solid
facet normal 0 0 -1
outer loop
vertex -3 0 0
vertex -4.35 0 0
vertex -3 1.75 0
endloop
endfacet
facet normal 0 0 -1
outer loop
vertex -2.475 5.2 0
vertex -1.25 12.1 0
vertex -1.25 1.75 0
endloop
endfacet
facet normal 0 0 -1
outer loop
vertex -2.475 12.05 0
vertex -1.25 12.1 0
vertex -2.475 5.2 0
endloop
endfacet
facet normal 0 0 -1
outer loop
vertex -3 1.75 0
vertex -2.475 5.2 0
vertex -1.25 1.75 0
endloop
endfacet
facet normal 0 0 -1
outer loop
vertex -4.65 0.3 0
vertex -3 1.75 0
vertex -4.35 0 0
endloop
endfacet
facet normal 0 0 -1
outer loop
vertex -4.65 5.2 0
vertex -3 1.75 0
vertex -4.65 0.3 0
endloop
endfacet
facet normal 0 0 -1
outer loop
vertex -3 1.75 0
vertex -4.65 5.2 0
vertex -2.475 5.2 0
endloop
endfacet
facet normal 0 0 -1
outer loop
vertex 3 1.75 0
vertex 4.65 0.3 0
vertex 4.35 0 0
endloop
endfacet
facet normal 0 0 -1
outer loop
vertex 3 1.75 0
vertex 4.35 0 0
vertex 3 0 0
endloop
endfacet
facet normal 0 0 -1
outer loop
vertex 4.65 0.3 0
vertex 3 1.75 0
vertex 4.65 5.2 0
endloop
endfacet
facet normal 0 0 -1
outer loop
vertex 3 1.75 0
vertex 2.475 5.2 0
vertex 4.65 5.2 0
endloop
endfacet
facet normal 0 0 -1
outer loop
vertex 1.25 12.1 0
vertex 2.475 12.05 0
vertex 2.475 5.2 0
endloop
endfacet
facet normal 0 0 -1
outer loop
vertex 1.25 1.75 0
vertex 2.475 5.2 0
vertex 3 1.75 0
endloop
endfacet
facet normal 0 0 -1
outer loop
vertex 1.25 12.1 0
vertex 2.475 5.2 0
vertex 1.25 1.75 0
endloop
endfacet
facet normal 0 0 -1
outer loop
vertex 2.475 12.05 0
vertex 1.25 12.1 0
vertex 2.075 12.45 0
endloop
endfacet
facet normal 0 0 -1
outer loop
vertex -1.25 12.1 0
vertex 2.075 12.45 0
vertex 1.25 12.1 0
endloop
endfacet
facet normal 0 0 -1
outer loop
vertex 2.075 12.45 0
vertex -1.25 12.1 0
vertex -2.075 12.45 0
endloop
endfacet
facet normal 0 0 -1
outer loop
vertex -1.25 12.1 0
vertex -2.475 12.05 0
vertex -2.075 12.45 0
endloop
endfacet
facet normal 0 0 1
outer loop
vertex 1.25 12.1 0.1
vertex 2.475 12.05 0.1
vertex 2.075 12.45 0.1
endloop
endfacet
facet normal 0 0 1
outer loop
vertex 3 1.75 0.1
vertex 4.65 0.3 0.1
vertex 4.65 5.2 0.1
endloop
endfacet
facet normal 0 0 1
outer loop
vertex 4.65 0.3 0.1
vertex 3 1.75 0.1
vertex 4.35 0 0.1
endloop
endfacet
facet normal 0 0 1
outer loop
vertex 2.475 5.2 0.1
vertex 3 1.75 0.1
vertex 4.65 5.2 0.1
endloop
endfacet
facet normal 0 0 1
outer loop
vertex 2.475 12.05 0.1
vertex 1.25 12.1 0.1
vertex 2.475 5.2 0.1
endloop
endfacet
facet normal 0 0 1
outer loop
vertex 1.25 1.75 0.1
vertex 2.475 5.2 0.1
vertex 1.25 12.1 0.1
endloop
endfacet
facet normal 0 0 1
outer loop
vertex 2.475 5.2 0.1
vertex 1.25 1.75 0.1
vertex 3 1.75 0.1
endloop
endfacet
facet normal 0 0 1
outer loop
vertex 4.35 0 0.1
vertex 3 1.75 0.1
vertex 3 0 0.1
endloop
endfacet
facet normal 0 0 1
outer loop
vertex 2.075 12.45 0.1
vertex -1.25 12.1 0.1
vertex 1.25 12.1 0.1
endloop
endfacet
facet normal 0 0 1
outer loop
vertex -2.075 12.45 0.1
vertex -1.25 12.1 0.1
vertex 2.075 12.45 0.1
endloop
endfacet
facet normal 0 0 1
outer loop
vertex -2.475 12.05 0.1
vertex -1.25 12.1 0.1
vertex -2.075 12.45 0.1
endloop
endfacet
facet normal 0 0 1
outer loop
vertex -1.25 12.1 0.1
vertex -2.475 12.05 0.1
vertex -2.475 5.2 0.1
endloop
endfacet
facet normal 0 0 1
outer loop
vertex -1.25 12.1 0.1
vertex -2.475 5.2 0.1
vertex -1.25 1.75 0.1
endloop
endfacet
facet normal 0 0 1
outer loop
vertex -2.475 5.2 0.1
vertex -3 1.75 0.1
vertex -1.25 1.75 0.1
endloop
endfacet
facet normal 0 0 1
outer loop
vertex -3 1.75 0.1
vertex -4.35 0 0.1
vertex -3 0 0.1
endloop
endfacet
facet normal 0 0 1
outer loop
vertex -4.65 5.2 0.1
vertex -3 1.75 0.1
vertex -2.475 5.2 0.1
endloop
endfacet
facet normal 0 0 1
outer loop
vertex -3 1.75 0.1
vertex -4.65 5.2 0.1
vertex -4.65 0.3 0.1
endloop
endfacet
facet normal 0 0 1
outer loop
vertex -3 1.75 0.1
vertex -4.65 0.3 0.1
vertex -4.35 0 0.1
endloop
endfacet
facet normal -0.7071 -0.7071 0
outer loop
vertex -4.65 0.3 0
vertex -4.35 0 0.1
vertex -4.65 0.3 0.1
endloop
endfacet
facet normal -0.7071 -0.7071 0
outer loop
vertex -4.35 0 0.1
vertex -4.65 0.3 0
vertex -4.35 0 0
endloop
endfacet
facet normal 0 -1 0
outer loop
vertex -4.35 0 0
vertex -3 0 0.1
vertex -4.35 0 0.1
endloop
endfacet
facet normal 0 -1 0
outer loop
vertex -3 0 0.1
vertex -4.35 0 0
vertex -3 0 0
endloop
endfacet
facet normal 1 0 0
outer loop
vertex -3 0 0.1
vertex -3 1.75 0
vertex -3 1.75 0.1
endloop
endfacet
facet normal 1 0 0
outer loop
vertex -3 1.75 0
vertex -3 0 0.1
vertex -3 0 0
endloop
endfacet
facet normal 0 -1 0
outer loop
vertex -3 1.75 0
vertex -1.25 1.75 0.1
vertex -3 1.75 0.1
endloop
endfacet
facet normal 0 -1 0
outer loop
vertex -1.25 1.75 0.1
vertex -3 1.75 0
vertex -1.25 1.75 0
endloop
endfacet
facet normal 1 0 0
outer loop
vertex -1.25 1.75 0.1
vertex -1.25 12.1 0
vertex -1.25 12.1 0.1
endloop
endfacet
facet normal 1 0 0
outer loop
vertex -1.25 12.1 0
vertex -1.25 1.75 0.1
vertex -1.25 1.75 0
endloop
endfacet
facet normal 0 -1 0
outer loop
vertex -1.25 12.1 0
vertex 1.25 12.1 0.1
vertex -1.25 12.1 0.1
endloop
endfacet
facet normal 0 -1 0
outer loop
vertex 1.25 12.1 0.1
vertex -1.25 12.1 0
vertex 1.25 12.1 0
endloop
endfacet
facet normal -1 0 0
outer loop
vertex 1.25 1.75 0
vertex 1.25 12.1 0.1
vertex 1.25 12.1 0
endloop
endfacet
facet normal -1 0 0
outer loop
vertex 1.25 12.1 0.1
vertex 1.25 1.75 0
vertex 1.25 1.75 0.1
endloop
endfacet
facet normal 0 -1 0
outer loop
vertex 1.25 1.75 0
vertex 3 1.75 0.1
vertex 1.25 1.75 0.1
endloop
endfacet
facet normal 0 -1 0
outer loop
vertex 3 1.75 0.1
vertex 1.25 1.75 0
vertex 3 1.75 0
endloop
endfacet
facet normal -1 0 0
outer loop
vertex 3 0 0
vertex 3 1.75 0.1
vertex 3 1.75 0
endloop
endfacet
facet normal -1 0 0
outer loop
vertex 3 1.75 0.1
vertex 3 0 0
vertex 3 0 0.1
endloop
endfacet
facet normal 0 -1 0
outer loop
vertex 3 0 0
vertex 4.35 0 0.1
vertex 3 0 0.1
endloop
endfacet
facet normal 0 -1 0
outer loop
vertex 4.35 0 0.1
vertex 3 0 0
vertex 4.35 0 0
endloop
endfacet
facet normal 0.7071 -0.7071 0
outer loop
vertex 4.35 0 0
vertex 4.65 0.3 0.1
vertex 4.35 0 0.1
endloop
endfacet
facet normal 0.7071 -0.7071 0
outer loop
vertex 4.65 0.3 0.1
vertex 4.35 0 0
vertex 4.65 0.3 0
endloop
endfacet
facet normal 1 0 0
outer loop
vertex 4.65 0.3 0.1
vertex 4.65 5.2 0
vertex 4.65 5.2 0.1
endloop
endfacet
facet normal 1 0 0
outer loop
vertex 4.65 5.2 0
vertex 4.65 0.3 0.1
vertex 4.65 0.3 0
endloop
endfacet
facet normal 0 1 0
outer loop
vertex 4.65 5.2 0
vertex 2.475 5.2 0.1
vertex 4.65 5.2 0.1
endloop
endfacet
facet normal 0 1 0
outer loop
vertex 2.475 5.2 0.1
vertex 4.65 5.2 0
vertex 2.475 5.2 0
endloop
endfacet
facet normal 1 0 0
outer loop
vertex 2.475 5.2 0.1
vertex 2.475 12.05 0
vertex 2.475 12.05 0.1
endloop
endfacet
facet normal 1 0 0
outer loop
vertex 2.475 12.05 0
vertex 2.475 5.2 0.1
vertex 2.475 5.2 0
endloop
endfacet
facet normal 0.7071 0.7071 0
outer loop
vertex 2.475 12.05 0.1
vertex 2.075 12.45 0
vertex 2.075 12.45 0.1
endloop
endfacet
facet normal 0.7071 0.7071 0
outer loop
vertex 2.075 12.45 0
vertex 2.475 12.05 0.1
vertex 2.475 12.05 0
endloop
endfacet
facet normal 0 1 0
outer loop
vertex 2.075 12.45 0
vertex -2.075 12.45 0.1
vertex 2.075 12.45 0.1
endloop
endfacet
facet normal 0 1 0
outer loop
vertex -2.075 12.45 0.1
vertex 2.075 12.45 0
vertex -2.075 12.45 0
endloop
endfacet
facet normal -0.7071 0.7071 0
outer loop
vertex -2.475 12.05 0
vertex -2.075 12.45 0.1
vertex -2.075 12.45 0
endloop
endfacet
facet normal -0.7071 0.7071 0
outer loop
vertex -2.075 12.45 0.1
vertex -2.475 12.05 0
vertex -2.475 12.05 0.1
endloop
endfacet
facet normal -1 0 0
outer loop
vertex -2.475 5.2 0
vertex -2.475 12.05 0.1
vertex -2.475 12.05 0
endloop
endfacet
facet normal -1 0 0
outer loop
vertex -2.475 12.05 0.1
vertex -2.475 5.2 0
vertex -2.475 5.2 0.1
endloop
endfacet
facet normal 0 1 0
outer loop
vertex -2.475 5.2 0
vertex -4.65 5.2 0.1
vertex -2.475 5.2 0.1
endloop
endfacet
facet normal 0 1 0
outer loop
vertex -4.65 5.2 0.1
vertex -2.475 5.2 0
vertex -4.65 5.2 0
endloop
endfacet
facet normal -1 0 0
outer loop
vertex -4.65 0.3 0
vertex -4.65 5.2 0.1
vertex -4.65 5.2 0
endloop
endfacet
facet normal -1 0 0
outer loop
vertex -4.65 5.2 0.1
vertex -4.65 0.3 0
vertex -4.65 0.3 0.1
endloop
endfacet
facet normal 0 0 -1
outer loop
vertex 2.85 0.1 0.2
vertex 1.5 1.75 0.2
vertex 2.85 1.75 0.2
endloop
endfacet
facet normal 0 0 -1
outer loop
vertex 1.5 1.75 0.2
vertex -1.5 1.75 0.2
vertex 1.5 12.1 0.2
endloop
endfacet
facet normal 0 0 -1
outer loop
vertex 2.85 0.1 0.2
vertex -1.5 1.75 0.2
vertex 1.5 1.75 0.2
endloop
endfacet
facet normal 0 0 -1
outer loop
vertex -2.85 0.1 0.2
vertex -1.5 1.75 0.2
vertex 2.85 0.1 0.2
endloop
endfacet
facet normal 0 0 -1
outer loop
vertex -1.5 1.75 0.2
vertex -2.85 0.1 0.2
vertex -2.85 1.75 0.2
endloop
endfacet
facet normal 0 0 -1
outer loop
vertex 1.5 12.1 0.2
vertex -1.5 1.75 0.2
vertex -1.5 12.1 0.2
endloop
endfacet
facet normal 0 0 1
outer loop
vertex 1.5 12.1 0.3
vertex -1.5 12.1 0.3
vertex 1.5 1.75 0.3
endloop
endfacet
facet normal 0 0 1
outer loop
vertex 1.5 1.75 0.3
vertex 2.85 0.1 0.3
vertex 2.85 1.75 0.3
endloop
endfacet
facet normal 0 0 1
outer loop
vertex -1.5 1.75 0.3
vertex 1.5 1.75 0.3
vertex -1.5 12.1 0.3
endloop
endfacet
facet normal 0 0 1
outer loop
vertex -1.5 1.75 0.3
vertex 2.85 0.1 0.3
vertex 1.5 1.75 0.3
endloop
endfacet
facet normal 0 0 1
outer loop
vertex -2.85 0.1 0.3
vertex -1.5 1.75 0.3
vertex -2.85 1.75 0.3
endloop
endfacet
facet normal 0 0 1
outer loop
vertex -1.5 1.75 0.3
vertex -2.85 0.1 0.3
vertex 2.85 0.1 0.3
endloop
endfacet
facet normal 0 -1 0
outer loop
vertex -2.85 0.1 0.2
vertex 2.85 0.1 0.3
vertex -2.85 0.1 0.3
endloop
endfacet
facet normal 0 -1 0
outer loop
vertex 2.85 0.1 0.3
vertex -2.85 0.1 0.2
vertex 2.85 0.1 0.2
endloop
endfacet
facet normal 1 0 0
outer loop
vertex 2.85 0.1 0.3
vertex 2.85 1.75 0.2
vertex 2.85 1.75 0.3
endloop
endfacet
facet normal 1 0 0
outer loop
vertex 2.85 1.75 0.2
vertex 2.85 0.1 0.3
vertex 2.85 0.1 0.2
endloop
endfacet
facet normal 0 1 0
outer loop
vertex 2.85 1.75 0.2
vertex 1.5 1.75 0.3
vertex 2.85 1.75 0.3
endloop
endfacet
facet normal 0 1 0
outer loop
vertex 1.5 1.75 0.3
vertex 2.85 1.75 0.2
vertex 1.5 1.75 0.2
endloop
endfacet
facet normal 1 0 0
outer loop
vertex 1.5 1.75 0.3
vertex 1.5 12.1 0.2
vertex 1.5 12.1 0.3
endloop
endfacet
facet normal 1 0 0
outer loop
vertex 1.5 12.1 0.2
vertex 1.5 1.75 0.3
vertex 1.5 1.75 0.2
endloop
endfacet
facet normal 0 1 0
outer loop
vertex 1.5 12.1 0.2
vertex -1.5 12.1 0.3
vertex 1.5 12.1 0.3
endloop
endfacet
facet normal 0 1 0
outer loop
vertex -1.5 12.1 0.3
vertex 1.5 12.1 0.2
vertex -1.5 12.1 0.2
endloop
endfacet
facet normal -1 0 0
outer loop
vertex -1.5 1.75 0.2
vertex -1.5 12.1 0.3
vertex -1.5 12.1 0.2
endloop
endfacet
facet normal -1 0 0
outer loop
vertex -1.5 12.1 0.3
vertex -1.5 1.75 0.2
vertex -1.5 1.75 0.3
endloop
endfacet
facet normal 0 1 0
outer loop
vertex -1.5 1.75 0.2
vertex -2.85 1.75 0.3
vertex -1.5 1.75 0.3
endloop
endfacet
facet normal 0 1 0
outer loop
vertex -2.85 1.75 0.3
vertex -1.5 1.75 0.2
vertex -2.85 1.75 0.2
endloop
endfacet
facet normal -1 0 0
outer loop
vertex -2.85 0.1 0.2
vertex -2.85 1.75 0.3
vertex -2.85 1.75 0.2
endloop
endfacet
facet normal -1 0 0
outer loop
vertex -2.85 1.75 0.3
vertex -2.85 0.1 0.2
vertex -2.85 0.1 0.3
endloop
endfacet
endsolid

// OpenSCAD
// Przekrój trzpienia kardana z wkrętem M3 × 10 ISO 7380 do instrukcji montażu (trzpien-kardana.png): płaski przekrój osiowy.
// openscad -o trzpien-kardana.png --imgsize=1200,900 --camera=0,6.2,0,0,0,0,48 --projection=o --colorscheme=Tomorrow trzpien-przekroj.scad
include <../../../duze-oko-v3.scad>
czesc = "brak";
module przekroj() projection(cut = true) rotate([-90, 0, 0]) children();   // płaszczyzna przez oś; oś pionowo, kołnierz na dole
color("orange") linear_extrude(0.1) przekroj() trzpien_kardana();
color("dimgray") translate([0, 0, 0.2]) linear_extrude(0.1) przekroj() {
  translate([0, 0, 0.1]) cylinder(d = 5.7, h = 1.65, $fn = 48); translate([0, 0, 1.75]) cylinder(d = 3, h = tk_m3_dl, $fn = 24); }
